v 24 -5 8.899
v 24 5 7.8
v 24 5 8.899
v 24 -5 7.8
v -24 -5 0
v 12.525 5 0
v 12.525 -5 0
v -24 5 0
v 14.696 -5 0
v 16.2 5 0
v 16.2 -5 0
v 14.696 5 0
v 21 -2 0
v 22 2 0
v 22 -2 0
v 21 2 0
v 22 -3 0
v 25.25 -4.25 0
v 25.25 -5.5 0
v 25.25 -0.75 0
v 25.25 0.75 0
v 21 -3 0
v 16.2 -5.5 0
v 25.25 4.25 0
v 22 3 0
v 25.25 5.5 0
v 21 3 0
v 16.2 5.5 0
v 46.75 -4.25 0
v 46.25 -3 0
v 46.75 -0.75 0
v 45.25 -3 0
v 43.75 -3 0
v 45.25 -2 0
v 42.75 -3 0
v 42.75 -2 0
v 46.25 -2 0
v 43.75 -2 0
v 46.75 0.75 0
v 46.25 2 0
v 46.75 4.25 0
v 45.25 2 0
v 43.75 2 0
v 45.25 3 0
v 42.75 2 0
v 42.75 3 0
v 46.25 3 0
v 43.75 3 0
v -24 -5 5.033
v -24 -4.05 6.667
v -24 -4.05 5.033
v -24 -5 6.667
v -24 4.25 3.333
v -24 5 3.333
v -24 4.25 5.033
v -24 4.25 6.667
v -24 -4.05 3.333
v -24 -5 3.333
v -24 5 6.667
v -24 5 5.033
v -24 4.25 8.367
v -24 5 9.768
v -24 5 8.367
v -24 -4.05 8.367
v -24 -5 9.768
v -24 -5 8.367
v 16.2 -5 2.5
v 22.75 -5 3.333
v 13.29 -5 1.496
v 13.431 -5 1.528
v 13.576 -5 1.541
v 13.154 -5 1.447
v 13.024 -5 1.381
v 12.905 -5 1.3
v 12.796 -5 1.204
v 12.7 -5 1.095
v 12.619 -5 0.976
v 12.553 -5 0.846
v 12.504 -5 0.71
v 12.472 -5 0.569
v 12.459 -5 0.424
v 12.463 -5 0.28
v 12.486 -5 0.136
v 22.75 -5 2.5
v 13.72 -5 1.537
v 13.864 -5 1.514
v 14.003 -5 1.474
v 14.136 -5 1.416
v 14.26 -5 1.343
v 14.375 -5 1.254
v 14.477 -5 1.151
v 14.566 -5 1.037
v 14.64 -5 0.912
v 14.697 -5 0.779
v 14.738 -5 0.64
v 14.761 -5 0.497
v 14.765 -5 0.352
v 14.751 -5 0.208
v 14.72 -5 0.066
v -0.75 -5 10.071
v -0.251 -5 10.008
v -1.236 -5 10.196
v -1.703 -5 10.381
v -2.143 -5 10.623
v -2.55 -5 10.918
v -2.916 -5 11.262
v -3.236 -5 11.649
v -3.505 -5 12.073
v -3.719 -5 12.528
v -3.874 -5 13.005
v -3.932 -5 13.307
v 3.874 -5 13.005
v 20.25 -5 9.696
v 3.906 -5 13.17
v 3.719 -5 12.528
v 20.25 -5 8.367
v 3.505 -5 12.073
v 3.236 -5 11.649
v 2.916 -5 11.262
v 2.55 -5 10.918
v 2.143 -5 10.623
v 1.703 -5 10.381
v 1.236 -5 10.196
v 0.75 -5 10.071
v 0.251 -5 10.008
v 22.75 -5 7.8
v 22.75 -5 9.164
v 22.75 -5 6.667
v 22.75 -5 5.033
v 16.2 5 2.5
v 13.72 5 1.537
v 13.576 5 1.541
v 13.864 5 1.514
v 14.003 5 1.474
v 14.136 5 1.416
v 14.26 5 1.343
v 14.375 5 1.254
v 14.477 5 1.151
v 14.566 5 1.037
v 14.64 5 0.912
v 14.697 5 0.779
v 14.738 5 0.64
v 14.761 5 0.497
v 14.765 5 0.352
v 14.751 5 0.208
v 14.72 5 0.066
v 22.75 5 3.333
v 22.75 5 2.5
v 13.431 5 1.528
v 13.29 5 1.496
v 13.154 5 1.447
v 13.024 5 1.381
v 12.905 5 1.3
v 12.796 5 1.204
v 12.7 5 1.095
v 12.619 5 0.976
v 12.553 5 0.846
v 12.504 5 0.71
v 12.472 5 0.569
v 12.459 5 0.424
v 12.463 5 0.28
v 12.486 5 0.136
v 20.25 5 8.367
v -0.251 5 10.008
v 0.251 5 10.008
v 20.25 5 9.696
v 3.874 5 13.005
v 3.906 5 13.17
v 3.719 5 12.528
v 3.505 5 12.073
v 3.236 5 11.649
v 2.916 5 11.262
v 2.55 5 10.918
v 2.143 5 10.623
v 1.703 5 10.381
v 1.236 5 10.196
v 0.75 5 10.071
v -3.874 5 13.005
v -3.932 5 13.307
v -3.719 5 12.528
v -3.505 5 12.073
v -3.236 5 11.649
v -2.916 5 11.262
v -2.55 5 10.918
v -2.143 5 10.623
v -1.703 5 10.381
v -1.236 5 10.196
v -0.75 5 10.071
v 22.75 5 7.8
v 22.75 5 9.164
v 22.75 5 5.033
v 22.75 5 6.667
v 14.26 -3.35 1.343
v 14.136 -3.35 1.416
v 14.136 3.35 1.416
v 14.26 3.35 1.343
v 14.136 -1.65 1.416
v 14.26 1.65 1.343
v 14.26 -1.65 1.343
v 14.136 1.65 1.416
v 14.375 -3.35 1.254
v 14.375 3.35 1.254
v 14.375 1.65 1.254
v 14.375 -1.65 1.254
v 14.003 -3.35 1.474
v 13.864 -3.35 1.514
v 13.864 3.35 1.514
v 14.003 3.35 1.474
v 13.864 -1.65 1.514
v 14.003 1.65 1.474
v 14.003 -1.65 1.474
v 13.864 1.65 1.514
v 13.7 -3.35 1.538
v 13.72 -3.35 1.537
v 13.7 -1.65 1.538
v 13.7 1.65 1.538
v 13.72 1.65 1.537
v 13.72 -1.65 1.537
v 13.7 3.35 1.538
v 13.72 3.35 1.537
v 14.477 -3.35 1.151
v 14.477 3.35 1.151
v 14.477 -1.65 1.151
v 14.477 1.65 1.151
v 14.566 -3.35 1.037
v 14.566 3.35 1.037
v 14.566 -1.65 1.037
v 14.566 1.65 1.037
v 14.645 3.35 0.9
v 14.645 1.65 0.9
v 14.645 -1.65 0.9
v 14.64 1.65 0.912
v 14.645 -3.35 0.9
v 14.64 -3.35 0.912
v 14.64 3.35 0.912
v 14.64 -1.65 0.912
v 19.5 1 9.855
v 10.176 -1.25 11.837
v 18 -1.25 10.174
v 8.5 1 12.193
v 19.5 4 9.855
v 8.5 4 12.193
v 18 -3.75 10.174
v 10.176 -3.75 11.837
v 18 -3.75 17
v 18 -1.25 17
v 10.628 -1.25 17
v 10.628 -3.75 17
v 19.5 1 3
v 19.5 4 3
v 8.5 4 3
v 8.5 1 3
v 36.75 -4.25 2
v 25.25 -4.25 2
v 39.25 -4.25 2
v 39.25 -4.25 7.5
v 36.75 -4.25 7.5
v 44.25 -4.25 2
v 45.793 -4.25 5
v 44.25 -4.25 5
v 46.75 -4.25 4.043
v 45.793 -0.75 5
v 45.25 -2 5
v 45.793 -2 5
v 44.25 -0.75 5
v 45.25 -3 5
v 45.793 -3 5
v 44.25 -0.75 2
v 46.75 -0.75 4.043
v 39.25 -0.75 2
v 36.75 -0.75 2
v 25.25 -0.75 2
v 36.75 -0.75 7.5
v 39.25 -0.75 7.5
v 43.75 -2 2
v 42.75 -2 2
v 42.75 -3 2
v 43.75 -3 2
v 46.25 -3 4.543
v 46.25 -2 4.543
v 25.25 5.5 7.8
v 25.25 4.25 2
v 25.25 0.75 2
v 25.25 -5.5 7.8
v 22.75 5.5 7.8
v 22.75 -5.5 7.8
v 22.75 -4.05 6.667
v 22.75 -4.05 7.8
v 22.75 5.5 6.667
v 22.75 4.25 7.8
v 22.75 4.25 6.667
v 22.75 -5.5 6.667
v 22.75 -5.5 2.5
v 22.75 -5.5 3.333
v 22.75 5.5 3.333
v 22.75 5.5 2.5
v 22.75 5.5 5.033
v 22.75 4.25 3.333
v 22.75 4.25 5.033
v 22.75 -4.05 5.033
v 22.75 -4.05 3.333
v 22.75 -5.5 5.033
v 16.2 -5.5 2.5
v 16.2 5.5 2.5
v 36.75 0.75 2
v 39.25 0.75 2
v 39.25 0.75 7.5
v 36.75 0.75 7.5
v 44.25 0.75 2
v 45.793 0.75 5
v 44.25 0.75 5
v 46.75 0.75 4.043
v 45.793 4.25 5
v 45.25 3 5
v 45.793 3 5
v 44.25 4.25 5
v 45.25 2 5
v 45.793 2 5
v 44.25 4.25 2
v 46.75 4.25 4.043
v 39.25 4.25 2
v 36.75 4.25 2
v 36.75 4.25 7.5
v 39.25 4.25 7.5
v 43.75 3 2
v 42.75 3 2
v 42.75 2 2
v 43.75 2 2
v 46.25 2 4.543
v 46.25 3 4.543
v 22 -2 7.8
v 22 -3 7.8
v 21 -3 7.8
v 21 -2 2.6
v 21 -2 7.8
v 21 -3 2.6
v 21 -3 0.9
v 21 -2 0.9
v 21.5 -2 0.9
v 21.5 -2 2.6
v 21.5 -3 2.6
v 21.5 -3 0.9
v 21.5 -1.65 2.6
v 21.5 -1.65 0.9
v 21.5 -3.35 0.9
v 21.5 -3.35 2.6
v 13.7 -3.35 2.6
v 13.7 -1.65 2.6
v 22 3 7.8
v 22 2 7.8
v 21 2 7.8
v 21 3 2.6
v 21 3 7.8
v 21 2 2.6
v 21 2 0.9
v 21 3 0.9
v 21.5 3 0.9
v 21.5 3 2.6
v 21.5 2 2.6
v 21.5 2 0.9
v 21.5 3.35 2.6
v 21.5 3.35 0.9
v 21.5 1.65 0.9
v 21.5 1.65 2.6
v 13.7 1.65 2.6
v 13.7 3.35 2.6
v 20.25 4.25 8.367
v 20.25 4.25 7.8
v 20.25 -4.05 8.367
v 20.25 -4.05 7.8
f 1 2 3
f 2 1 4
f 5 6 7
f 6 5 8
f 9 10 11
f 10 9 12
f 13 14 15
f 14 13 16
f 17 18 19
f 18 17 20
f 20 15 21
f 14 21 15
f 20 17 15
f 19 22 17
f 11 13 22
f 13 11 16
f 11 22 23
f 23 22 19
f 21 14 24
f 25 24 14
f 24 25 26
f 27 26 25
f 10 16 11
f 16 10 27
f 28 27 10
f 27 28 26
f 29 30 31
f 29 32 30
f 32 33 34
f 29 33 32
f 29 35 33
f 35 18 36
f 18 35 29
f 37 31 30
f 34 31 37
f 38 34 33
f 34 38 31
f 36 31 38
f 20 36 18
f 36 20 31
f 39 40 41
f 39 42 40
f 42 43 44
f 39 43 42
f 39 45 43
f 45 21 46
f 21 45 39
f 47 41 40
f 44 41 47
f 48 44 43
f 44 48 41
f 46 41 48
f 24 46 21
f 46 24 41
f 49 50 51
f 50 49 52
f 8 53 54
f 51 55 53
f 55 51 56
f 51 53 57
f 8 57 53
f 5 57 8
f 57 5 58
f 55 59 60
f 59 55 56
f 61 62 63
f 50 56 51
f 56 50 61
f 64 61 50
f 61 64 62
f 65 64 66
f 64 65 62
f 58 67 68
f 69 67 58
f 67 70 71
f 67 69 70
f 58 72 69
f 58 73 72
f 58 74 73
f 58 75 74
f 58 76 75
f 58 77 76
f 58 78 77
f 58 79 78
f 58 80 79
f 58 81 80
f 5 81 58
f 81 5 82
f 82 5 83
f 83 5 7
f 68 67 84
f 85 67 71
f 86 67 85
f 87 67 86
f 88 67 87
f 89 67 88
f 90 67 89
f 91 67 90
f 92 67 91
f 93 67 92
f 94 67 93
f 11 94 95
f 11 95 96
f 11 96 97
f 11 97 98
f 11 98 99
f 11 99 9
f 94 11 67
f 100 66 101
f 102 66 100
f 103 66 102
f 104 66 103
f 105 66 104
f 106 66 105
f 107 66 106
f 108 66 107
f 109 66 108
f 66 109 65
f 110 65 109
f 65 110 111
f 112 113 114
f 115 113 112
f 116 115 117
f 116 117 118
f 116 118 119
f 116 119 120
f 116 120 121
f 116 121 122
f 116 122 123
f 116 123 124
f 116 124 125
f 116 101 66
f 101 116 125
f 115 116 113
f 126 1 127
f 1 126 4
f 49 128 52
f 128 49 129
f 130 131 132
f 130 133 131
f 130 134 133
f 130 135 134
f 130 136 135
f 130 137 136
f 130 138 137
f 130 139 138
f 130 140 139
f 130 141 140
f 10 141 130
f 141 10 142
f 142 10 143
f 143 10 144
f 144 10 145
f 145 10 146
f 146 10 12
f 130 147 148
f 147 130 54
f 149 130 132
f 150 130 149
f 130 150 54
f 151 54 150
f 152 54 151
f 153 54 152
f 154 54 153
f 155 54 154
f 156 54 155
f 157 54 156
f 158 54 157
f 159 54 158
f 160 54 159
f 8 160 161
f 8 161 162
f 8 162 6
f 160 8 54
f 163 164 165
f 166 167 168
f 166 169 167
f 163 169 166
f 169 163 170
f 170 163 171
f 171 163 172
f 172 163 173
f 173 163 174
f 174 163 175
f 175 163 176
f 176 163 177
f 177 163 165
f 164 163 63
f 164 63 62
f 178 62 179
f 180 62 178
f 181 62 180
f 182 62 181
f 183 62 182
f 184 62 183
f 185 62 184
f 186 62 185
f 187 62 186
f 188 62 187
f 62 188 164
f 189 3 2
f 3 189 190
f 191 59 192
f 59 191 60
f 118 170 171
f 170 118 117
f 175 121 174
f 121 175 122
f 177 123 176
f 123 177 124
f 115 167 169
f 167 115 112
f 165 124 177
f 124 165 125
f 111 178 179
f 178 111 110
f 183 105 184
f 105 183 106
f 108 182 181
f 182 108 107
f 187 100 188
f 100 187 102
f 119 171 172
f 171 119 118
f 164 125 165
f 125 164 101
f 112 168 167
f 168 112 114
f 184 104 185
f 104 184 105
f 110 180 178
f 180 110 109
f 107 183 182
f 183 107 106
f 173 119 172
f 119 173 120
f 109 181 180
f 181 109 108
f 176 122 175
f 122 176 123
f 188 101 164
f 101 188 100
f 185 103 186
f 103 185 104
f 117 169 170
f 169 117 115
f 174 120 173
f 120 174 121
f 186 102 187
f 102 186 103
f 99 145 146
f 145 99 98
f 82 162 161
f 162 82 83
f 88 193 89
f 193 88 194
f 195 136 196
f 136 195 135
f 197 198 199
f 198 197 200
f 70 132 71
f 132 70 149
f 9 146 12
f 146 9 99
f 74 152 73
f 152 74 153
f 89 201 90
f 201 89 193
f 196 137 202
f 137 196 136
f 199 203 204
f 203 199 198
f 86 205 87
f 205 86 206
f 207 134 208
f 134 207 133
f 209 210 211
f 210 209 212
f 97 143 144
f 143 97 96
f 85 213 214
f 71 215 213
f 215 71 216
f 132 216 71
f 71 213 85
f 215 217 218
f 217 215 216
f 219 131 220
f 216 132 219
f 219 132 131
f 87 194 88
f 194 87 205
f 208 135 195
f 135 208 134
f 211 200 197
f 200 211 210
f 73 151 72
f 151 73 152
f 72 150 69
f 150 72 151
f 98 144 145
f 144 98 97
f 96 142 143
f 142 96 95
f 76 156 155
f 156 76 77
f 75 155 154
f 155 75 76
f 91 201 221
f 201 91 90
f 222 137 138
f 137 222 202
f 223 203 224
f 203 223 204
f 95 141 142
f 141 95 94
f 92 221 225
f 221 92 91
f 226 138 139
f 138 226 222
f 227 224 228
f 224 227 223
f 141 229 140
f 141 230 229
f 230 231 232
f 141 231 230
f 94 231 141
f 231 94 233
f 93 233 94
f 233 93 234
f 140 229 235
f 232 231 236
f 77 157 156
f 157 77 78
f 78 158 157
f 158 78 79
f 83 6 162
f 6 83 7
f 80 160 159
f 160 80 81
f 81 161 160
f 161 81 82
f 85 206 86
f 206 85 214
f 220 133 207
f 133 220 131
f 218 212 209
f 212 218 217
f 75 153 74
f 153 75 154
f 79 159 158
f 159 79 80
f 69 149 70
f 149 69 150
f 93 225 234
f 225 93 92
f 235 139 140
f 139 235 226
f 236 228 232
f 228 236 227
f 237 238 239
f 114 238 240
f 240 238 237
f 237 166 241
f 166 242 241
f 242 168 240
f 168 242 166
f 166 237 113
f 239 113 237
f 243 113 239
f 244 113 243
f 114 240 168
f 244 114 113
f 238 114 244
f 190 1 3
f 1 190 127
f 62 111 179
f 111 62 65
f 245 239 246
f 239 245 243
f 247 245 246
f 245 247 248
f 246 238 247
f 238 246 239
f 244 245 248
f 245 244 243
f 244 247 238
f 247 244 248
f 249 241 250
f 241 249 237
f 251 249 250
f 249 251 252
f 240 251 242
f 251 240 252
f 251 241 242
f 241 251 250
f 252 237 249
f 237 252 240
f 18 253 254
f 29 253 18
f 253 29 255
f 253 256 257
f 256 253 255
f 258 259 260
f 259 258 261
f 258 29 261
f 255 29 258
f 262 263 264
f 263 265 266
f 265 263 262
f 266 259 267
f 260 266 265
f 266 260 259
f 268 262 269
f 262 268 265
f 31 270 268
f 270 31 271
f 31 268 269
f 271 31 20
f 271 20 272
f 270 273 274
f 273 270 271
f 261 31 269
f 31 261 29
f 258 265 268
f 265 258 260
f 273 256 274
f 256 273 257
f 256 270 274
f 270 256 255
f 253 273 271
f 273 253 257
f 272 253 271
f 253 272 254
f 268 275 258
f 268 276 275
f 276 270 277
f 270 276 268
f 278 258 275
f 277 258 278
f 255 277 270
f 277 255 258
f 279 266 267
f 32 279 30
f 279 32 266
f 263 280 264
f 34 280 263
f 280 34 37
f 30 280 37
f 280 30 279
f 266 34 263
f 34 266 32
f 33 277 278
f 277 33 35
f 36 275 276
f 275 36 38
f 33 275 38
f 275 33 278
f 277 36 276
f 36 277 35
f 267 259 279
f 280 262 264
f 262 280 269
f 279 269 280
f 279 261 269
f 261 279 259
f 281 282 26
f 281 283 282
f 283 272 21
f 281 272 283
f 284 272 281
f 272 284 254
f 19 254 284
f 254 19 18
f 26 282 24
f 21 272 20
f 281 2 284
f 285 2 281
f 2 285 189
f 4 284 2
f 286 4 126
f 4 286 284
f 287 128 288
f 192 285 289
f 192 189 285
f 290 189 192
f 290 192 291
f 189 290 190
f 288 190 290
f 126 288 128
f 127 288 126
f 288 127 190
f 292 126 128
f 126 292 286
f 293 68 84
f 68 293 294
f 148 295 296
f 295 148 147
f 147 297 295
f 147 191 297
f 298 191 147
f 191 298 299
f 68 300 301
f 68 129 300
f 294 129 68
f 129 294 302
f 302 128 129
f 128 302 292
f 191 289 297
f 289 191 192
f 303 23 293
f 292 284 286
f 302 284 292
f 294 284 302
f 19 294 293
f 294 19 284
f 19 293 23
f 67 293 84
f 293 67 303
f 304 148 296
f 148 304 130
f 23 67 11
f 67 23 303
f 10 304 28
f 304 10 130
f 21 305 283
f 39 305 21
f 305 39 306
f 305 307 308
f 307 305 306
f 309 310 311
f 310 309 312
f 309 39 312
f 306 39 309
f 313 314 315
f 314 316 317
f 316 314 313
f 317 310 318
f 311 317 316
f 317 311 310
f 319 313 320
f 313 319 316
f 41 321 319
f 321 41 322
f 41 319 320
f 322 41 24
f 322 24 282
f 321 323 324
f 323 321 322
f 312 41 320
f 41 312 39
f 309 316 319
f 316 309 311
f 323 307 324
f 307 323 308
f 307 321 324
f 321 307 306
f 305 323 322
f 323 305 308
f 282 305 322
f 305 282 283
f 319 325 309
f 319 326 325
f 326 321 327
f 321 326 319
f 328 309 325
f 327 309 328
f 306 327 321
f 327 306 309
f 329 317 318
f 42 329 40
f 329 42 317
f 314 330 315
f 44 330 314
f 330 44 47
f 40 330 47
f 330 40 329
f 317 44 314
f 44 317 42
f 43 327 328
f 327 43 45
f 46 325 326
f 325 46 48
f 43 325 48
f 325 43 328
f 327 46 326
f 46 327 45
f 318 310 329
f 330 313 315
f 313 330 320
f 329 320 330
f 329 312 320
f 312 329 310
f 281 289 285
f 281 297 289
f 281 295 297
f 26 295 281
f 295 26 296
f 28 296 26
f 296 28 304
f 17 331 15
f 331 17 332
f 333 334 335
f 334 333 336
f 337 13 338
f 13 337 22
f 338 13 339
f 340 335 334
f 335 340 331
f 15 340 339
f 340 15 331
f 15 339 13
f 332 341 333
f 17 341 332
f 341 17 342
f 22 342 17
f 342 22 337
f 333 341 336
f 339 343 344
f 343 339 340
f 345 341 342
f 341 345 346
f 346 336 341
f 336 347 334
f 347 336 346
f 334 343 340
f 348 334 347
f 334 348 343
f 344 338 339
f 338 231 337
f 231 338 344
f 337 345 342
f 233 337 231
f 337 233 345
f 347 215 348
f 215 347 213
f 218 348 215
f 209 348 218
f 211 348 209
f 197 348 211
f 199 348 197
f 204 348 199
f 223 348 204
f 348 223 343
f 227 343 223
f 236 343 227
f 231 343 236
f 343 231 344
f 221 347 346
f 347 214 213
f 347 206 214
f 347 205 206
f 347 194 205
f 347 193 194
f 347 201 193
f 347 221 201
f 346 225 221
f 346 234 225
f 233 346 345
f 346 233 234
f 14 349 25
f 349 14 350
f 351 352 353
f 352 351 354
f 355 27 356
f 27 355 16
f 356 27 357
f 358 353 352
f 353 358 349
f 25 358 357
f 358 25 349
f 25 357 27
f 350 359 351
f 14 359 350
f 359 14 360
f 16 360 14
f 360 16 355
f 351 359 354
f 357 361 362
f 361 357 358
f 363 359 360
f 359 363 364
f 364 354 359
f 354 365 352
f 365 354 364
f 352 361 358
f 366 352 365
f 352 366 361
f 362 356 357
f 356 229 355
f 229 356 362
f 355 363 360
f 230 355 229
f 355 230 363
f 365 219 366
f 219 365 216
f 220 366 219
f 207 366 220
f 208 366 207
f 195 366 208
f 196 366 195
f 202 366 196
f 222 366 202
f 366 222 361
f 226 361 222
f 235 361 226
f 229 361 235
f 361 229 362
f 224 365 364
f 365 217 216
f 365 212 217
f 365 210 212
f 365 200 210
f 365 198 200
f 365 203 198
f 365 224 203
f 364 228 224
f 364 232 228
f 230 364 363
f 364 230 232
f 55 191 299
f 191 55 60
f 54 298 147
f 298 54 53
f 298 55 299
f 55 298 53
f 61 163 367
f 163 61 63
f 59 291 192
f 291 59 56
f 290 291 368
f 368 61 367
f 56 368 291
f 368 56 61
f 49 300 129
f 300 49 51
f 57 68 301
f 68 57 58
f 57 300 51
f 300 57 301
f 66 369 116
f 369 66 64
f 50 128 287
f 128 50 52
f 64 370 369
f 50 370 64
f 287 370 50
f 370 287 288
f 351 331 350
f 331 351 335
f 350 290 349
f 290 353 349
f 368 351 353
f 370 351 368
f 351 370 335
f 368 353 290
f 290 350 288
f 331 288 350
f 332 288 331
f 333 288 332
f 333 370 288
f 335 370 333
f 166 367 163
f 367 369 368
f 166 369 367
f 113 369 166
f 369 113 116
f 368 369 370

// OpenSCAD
$fn=8;

ts=2.5; // толщина стенки
tp=1;//диаметр жилы
tpr=1.7;//диаметр провода
trb=[2,tp,3];//внешний, внутренний высота
knt=[20,11, 7.5, 7.8];//высота до центра, толщина, высота стопора
lin=[3.5,knt.x+trb.x,2];//ширина, длина, толщина
dkn=2.5;//длина контактной площадки
shp=.0;//высота шипа
do=3.8;
step=5;//шаг контактов
kk=2;//количество контактов
hhr=4.5+0.5;//высота верхней части раъема
//прищепка
prk=[8,10,1.5,24,10];//диаметр опоры, ширина,диаметр проволоки, длина плеча,высота половины


alll();
//alll_0();
module alll(){
    difference(){
        union(){
            prih();
            translate([0, -step*(kk-1)/2, 0]) {
                for(a=[0:1:kk-1]){
                    translate([0,a*step,0]){
                        translate([lin.y+prk[3],0,0])rotate([0,0,-90])pin_lin();
                        translate([prk[3],0,knt[3]/2])cube([ts,step+1,knt[3]],true);
                        translate([prk[3]-knt[3]/2,0,ts/2])cube([knt[3],step+1,ts],true);
                    }
                }
            }
        }
        for(a=[0:1:kk-1]){
            translate([0,a*step,0]){
                translate([prk[3]-ts,-step*(kk-1)/2,ts])cube([tp,tp,ts*13],true);
                translate([prk[3]-ts-knt[3]/2,-step*(kk-1)/2,ts-tpr/2+0.1])cube([knt[3],tpr,tpr],true);
            }
        }
        translate([prk[3]-ts,0,knt[3]+ts*3/2])cube([ts,prk.y*2,ts*3],true);
        translate([-prk[3]*2+prk[3]-ts/2,0,0]){
            translate([0,step+0.1,tpr/2+prk[4]/3])cube([prk[3]*4,tpr,tpr],true);
            translate([0,step+0.1,tpr/2+2*prk[4]/3])cube([prk[3]*4,tpr,tpr],true);
            translate([0,-step+0.1,tpr/2+prk[4]/3])cube([prk[3]*4,tpr,tpr],true);
            translate([0,-step+0.1,tpr/2+2*prk[4]/3])cube([prk[3]*4,tpr,tpr],true);
        }
        
    }
}
module alll_0(){
    difference(){
        union(){
            prih();
            translate([0, -step*(kk-1)/2, 0]) {
                for(a=[0:1:kk-1]){
                    translate([0,a*step,0]){
                        translate([lin.y+prk[3],0,0])rotate([0,0,-90])pin_lin_0();
                        translate([prk[3],0,knt[3]/2])cube([ts,step+1,knt[3]],true);
                        translate([prk[3]-knt[3]/2,0,ts/2])cube([knt[3],step+1,ts],true);
                    }
                }
            }
        }
        //for(a=[0:1:kk-1]){
           // translate([0,a*step,0]){
               // translate([prk[3]-ts,-step*(kk-1)/2,ts])cube([tp,tp,ts*13],true);
               // translate([prk[3]-ts-knt[3]/2,-step*(kk-1)/2,ts-tpr/2+0.1])cube([knt[3],tpr,tpr],true);
           // }
        //}
        //translate([prk[3]-ts,0,knt[3]+ts*3/2])cube([ts,prk.y*2,ts*3],true);
        //translate([-prk[3]*2+prk[3]-ts/2,0,0]){
          //  translate([0,step+0.1,tpr/2+prk[4]/3])cube([prk[3]*4,tpr,tpr],true);
          //  translate([0,step+0.1,tpr/2+2*prk[4]/3])cube([prk[3]*4,tpr,tpr],true);
          //  translate([0,-step+0.1,tpr/2+prk[4]/3])cube([prk[3]*4,tpr,tpr],true);
          //  translate([0,-step+0.1,tpr/2+2*prk[4]/3])cube([prk[3]*4,tpr,tpr],true);
       // }
        
    }
}

module prih(){
    $fn=50;
    difference(){
        union(){
            translate([0, 0, (prk[4]+prk[0]/2)])rotate([180,0,0])difference(){
                translate([0, 0, (prk[4]+prk[0]/2)/2]) cube([prk[3]*2,prk[1],prk[4]+prk[0]/2],true);
                translate([0, -prk[1]/2-0.5,0])rotate([-90,0,0])cylinder(prk[1]+1,prk[0]/2,prk[0]/2);
                rotate([0,-45,0])translate([prk[3]-prk[0]/2-prk[2]/2, -prk[1]/2-0.5,0])rotate([-90,0,0])cylinder(prk[1]+1,prk[2]/1.3,prk[2]/1.3);
                rotate([0,-12,0])translate([0, 0, -(prk[4]+prk[0]/2)/2]) cube([prk[3]*4,prk[1]*2,prk[4]+prk[0]/2],true);
                rotate([0,10,0])translate([0, 0, -(prk[4]+prk[0]/2)/2]) cube([prk[3]*4,prk[1]*2,prk[4]+prk[0]/2],true);
            }
            difference(){
                translate([prk[3]-prk[1], -2*ts/2, prk[4]]) cube([prk[1]-2,ts,prk[4]*1.4],true);
                translate([prk[3]-prk[1]-(prk[1]-2), -2*ts/2, prk[4]]) rotate([0,5,0])cube([prk[1]-2,ts*2,prk[4]*2],true);
            }
        }
        translate([(prk[3]-prk[1]), 2*ts/2, prk[4]]) cube([prk[1]+1,ts+0.5,prk[4]*1.4],true);
    }
    
}

//all_2();
module all_2(){
    difference(){
        union(){
            for(a=[0:1:kk-1]){
                translate([0,0,a*step])pin2();
            }
            for(a=[0:1:kk-1]){
                translate([knt[3]/2,0,a*step+step/2])ship();
            }
            hh=step*kk;
            translate([knt.y+ts/2, 0, hh/2]) cube([ts,knt.x*2,hh],true);
            translate([knt.y/2, -ts/2, hh/2]) cube([knt.y+ts+lin.z,ts,hh],true);
        }
        for(a=[0:1:kk-1]){
            translate([0,0,a*step])pin3();
        }
        for(a=[0:1:kk-1]){
            translate([0,0,a*step])pin4();
        }
    }
}

module ship(){
    intersection(){
        rotate([-90,0,0])cylinder(shp,do/2,do/2);
        cube([ts,do*4,8],true);
    }
}


module pin4(){
    translate([knt.x/2,-ts-0.1,step/2])cube([knt.x*2,tp,tp],true);;
}

module pin3(){
    translate([knt.y+ts,-knt.x/2-ts,step/2])cube([tpr,knt.x,tpr],true);;
}


module pin2(){
    //translate([-lin.z,knt.x,step/2])rotate([0,90,0])pin();
    translate([-lin.z,knt.x,step/2])rotate([0,90,0])pin_lin();
}

module pin1(){
    translate([0,0,lin.z])rotate([0,180,0])pin();
}

module pin(){
    difference(){
        union(){
            cylinder(trb.z+lin.z,trb.x/2,trb.x/2);
            translate([0, trb.x/2-lin.y/2,lin.z/2]) cube(lin,true);
        }
        translate([0,0,-0.1])cylinder(trb.z*2,trb.y/2,trb.y/2);
        translate([0,-(trb.x/2+trb.y),-0.1])cylinder(trb.z*2,trb.y/2,trb.y/2);
        translate([0, 0,trb.z+lin.z+trb.x/4]) rotate([-45,0,0])cube([trb.x*2,trb.x*2,trb.x/2],true);
    }
}

//pin_lin();
module pin_lin(){
    difference(){
        union(){
            //cylinder(trb.z+lin.z,trb.x/2,trb.x/2);
            translate([0, -trb.z/2+trb.y,(trb.z+lin.z)/2]) cube([lin.x,dkn,trb.z+lin.z],true);
            translate([0, -trb.z/2+trb.y-dkn/2-ts/2-hhr,(trb.z+lin.z+ts)/2]) cube([lin.x,ts,trb.z+lin.z+ts],true);
            translate([0, trb.x/2-lin.y/2-0.5,lin.z/2]) cube(lin,true);
        }
        //translate([0,-0.25,-0.1])cylinder(trb.z*2,trb.y/2,trb.y/2);
        translate([0,-0.25,trb.z-0.1])cube([trb.y,trb.y,trb.z*2],true);
        translate([0,-trb.z+0.25,trb.z-0.1])cube([trb.y,trb.y,trb.z*2],true);
        translate([0, 0,trb.z+lin.z+trb.x/4]) rotate([-45,0,0])cube([trb.x*2,trb.x*3,trb.x/2],true);
    }
}
module pin_lin_0(){
    difference(){
        union(){
            //cylinder(trb.z+lin.z,trb.x/2,trb.x/2);
            //translate([0, -trb.z/2+trb.y,(trb.z+lin.z)/2]) cube([lin.x,dkn,trb.z+lin.z],true);
           // translate([0, -trb.z/2+trb.y-dkn/2-ts/2-hhr,(trb.z+lin.z+ts)/2]) cube([lin.x,ts,trb.z+lin.z+ts],true);
            translate([0, trb.x/2-lin.y/2-0.5,lin.z]) cube([lin.x, lin.y, lin.z*2],true);
        }
        //translate([0,-0.25,-0.1])cylinder(trb.z*2,trb.y/2,trb.y/2);
        //translate([0,-0.25,trb.z-0.1])cube([trb.y,trb.y,trb.z*2],true);
        //translate([0,-trb.z+0.25,trb.z-0.1])cube([trb.y,trb.y,trb.z*2],true);
       // translate([0, 0,trb.z+lin.z+trb.x/4]) rotate([-45,0,0])cube([trb.x*2,trb.x*3,trb.x/2],true);
    }
}
module pin_s(){
    difference(){
        union(){
            cylinder(trb.z+lin.z-trb.x/2,trb.x/2,trb.x/2);
            translate([0, 0,trb.z+lin.z-trb.x/2])sphere(r=trb.x/2);
            translate([0, trb.x/2-lin.y/2,lin.z/2]) cube(lin,true);
        }
        translate([0,0,-0.1])cylinder(trb.z*2,trb.y/2,trb.y/2);
        translate([0,-(trb.x/2+trb.y),-0.1])cylinder(trb.z*2,trb.y/2,trb.y/2);
    }
}
